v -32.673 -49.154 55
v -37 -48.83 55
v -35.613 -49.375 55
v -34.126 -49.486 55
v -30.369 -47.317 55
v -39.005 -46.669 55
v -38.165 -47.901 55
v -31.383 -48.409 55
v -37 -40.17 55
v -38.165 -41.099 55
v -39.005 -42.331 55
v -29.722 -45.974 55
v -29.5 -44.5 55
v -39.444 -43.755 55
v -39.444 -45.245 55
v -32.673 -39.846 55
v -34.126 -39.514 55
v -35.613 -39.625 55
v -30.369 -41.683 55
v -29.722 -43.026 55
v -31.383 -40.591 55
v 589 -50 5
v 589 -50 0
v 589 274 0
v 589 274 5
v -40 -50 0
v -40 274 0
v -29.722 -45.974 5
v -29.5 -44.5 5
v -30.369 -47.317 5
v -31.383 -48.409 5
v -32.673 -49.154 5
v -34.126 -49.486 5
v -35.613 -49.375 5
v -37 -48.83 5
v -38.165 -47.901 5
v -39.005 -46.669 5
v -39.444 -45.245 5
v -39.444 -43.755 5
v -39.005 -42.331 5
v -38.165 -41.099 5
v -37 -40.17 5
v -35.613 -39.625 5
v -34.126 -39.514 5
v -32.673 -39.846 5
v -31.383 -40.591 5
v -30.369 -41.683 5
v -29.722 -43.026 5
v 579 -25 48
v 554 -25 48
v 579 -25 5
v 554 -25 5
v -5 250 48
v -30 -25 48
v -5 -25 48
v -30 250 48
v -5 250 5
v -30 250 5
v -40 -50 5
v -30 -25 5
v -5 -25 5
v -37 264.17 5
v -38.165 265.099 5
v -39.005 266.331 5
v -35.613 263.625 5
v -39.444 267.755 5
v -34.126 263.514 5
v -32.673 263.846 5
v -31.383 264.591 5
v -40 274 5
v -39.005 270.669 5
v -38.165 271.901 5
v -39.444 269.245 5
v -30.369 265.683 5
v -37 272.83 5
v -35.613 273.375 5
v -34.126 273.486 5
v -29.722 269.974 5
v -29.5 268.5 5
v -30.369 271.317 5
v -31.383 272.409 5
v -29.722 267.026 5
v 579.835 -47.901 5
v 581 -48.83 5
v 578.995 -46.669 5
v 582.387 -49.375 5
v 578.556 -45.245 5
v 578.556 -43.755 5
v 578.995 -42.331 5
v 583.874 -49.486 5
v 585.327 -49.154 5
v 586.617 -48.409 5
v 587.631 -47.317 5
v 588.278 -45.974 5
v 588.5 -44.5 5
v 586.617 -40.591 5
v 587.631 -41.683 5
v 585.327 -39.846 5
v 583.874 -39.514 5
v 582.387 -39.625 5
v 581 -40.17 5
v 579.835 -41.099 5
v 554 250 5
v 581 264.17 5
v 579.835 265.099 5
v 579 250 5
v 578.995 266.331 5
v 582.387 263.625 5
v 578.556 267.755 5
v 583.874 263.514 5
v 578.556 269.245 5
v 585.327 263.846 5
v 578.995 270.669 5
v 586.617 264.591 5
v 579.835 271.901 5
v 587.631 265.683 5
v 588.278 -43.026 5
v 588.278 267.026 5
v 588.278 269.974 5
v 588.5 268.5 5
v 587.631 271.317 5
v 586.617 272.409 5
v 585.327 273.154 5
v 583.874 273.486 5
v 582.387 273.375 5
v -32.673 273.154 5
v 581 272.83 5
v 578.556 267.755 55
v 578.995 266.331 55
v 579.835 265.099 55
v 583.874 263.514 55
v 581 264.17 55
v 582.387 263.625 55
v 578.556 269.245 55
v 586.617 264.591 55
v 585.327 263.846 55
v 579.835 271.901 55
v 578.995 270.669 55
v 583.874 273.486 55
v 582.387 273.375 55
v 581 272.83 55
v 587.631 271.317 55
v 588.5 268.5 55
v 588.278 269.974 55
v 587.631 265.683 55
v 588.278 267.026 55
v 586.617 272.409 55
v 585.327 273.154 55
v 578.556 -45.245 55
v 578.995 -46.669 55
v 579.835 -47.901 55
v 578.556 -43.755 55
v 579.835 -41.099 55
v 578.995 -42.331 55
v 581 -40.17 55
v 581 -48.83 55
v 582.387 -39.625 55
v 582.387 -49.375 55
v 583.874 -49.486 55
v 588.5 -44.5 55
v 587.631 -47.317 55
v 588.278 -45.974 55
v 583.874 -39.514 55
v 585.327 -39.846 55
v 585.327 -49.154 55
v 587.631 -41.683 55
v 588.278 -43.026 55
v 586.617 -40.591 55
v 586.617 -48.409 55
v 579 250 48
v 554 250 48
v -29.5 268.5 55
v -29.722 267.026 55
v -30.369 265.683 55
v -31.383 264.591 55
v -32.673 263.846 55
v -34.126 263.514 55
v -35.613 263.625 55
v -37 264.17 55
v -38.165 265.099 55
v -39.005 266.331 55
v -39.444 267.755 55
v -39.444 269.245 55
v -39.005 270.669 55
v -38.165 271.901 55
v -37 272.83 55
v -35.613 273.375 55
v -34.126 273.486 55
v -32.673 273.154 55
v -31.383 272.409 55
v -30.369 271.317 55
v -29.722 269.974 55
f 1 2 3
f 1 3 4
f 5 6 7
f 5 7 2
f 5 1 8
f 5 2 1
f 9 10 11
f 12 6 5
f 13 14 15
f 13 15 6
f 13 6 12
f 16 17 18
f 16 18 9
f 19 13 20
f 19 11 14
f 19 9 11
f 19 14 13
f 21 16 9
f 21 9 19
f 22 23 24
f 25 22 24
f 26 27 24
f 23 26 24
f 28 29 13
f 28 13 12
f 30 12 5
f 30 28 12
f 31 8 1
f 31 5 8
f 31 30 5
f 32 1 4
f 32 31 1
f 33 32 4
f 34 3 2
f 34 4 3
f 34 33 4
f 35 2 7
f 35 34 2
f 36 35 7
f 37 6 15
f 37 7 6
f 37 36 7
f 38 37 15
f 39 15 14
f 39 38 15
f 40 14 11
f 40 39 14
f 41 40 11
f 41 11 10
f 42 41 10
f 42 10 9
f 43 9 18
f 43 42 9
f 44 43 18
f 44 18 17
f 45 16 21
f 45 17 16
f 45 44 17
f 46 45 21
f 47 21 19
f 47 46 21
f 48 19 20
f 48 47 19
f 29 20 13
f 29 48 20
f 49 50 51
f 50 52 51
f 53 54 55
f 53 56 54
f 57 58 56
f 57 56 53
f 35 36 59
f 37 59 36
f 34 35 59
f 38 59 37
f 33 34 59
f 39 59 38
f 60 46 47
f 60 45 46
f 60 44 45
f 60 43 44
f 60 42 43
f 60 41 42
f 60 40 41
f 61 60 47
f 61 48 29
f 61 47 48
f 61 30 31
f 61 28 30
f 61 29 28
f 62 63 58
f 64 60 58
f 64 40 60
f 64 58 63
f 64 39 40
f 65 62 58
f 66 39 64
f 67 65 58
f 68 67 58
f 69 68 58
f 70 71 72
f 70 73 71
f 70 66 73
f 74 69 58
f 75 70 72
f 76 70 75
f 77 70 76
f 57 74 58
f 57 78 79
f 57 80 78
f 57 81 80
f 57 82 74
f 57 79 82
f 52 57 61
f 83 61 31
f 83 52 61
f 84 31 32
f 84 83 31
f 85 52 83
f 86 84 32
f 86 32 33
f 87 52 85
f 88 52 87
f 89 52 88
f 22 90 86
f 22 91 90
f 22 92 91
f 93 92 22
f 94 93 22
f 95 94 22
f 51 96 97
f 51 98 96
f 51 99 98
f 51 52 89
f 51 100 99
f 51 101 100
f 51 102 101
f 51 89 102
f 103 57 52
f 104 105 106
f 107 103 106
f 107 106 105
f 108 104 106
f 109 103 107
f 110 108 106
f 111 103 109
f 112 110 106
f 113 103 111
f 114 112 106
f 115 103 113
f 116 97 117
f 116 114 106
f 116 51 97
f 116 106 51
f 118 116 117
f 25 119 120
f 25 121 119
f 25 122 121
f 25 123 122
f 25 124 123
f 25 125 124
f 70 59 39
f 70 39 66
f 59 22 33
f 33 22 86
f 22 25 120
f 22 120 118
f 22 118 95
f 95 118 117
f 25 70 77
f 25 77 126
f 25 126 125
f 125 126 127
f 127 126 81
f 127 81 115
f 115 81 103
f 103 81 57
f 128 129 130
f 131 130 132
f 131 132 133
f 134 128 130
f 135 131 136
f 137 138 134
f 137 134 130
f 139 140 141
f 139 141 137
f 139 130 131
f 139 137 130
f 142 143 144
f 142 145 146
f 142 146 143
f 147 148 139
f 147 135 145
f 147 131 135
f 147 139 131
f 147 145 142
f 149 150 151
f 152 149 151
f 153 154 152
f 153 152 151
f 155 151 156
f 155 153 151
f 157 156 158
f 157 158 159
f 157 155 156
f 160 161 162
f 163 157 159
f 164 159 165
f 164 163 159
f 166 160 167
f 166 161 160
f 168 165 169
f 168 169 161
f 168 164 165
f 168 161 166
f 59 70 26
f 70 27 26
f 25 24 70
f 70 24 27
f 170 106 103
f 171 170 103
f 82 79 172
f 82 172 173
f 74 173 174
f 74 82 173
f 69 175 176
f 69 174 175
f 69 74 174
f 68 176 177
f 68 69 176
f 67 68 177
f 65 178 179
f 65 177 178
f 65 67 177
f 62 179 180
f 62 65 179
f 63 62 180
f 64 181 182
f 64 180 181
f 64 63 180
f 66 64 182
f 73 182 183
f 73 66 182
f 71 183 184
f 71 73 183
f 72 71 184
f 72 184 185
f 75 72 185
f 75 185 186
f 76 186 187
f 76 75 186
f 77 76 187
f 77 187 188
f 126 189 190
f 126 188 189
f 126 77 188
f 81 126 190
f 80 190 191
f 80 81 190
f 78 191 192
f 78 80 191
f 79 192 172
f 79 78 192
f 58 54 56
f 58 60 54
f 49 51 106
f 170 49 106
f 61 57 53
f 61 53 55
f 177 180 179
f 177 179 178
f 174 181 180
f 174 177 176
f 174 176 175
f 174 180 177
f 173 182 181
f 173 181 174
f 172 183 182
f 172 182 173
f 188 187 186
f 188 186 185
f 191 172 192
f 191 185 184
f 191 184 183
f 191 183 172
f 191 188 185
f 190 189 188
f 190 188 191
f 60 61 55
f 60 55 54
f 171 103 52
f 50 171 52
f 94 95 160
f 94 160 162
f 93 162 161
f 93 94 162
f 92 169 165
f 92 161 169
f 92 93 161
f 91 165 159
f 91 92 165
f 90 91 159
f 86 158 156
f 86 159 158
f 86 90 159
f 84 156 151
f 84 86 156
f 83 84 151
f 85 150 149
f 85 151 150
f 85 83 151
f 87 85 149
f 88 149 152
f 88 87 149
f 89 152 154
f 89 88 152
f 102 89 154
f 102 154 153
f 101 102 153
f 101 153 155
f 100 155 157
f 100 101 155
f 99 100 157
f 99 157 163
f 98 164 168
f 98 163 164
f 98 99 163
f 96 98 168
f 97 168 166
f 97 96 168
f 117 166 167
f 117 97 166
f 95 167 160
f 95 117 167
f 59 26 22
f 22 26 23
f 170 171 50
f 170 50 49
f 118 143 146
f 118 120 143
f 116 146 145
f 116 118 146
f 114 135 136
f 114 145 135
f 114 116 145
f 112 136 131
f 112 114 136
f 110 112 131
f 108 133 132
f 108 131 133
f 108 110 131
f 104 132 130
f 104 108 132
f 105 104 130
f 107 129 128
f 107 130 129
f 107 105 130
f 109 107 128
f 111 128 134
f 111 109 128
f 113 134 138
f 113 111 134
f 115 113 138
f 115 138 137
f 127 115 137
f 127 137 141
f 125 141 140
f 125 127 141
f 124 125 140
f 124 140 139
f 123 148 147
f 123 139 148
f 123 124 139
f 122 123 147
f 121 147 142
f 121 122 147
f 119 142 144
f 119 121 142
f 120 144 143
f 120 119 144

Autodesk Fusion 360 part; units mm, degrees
sketch "Sketch1" plane through (0, 0, 0) normal (0, 0, 1) x (1, 0, 0)
  line L0 (-40, -50) -> (589, -50)
  line L1 (589, -50) -> (589, 274)
  line L2 (589, 274) -> (-40, 274)
  line L3 (-40, 274) -> (-40, -50)
  circle A0 centre (583.5, -44.5) radius 5
  circle A1 centre (583.5, 268.5) radius 5
  circle A2 centre (-34.5, 268.5) radius 5
  circle A3 centre (-34.5, -44.5) radius 5
  line L4 (-30, 250) -> (-5, 250)
  line L5 (-5, 250) -> (-5, -25)
  line L6 (-5, -25) -> (-30, -25)
  line L7 (-30, -25) -> (-30, 250)
  line L8 (579, 250) -> (554, 250)
  line L9 (554, 250) -> (554, -25)
  line L10 (554, -25) -> (579, -25)
  line L11 (579, -25) -> (579, 250)
  dimension "d1" = 629
  dimension "d2" = 324
  dimension "d3" = 10
  dimension "d4" = 5.5
  dimension "d5" = 5.5
  dimension "d6" = 10
  dimension "d7" = 5.5
  dimension "d8" = 5.5
  dimension "d9" = 10
  dimension "d10" = 5.5
  dimension "d11" = 5.5
  dimension "d12" = 10
  dimension "d13" = 5.5
  dimension "d14" = 5.5
  dimension "d15" = 10
  dimension "d16" = 559
extrude "Extrude1" add sketch "Sketch1" along normal blind 5
extrude "Extrude2" add sketch "Sketch1" along normal blind 48 contours L4 L5 L6 L7 | L8 L9 L10 L11
extrude "Extrude3" add sketch "Sketch1" along normal blind 55 contours A3
extrude "Extrude4" add sketch "Sketch1" along normal blind 55 contours A2
extrude "Extrude5" add sketch "Sketch1" along normal blind 55 contours A1
extrude "Extrude6" add sketch "Sketch1" along normal blind 55 contours A0
